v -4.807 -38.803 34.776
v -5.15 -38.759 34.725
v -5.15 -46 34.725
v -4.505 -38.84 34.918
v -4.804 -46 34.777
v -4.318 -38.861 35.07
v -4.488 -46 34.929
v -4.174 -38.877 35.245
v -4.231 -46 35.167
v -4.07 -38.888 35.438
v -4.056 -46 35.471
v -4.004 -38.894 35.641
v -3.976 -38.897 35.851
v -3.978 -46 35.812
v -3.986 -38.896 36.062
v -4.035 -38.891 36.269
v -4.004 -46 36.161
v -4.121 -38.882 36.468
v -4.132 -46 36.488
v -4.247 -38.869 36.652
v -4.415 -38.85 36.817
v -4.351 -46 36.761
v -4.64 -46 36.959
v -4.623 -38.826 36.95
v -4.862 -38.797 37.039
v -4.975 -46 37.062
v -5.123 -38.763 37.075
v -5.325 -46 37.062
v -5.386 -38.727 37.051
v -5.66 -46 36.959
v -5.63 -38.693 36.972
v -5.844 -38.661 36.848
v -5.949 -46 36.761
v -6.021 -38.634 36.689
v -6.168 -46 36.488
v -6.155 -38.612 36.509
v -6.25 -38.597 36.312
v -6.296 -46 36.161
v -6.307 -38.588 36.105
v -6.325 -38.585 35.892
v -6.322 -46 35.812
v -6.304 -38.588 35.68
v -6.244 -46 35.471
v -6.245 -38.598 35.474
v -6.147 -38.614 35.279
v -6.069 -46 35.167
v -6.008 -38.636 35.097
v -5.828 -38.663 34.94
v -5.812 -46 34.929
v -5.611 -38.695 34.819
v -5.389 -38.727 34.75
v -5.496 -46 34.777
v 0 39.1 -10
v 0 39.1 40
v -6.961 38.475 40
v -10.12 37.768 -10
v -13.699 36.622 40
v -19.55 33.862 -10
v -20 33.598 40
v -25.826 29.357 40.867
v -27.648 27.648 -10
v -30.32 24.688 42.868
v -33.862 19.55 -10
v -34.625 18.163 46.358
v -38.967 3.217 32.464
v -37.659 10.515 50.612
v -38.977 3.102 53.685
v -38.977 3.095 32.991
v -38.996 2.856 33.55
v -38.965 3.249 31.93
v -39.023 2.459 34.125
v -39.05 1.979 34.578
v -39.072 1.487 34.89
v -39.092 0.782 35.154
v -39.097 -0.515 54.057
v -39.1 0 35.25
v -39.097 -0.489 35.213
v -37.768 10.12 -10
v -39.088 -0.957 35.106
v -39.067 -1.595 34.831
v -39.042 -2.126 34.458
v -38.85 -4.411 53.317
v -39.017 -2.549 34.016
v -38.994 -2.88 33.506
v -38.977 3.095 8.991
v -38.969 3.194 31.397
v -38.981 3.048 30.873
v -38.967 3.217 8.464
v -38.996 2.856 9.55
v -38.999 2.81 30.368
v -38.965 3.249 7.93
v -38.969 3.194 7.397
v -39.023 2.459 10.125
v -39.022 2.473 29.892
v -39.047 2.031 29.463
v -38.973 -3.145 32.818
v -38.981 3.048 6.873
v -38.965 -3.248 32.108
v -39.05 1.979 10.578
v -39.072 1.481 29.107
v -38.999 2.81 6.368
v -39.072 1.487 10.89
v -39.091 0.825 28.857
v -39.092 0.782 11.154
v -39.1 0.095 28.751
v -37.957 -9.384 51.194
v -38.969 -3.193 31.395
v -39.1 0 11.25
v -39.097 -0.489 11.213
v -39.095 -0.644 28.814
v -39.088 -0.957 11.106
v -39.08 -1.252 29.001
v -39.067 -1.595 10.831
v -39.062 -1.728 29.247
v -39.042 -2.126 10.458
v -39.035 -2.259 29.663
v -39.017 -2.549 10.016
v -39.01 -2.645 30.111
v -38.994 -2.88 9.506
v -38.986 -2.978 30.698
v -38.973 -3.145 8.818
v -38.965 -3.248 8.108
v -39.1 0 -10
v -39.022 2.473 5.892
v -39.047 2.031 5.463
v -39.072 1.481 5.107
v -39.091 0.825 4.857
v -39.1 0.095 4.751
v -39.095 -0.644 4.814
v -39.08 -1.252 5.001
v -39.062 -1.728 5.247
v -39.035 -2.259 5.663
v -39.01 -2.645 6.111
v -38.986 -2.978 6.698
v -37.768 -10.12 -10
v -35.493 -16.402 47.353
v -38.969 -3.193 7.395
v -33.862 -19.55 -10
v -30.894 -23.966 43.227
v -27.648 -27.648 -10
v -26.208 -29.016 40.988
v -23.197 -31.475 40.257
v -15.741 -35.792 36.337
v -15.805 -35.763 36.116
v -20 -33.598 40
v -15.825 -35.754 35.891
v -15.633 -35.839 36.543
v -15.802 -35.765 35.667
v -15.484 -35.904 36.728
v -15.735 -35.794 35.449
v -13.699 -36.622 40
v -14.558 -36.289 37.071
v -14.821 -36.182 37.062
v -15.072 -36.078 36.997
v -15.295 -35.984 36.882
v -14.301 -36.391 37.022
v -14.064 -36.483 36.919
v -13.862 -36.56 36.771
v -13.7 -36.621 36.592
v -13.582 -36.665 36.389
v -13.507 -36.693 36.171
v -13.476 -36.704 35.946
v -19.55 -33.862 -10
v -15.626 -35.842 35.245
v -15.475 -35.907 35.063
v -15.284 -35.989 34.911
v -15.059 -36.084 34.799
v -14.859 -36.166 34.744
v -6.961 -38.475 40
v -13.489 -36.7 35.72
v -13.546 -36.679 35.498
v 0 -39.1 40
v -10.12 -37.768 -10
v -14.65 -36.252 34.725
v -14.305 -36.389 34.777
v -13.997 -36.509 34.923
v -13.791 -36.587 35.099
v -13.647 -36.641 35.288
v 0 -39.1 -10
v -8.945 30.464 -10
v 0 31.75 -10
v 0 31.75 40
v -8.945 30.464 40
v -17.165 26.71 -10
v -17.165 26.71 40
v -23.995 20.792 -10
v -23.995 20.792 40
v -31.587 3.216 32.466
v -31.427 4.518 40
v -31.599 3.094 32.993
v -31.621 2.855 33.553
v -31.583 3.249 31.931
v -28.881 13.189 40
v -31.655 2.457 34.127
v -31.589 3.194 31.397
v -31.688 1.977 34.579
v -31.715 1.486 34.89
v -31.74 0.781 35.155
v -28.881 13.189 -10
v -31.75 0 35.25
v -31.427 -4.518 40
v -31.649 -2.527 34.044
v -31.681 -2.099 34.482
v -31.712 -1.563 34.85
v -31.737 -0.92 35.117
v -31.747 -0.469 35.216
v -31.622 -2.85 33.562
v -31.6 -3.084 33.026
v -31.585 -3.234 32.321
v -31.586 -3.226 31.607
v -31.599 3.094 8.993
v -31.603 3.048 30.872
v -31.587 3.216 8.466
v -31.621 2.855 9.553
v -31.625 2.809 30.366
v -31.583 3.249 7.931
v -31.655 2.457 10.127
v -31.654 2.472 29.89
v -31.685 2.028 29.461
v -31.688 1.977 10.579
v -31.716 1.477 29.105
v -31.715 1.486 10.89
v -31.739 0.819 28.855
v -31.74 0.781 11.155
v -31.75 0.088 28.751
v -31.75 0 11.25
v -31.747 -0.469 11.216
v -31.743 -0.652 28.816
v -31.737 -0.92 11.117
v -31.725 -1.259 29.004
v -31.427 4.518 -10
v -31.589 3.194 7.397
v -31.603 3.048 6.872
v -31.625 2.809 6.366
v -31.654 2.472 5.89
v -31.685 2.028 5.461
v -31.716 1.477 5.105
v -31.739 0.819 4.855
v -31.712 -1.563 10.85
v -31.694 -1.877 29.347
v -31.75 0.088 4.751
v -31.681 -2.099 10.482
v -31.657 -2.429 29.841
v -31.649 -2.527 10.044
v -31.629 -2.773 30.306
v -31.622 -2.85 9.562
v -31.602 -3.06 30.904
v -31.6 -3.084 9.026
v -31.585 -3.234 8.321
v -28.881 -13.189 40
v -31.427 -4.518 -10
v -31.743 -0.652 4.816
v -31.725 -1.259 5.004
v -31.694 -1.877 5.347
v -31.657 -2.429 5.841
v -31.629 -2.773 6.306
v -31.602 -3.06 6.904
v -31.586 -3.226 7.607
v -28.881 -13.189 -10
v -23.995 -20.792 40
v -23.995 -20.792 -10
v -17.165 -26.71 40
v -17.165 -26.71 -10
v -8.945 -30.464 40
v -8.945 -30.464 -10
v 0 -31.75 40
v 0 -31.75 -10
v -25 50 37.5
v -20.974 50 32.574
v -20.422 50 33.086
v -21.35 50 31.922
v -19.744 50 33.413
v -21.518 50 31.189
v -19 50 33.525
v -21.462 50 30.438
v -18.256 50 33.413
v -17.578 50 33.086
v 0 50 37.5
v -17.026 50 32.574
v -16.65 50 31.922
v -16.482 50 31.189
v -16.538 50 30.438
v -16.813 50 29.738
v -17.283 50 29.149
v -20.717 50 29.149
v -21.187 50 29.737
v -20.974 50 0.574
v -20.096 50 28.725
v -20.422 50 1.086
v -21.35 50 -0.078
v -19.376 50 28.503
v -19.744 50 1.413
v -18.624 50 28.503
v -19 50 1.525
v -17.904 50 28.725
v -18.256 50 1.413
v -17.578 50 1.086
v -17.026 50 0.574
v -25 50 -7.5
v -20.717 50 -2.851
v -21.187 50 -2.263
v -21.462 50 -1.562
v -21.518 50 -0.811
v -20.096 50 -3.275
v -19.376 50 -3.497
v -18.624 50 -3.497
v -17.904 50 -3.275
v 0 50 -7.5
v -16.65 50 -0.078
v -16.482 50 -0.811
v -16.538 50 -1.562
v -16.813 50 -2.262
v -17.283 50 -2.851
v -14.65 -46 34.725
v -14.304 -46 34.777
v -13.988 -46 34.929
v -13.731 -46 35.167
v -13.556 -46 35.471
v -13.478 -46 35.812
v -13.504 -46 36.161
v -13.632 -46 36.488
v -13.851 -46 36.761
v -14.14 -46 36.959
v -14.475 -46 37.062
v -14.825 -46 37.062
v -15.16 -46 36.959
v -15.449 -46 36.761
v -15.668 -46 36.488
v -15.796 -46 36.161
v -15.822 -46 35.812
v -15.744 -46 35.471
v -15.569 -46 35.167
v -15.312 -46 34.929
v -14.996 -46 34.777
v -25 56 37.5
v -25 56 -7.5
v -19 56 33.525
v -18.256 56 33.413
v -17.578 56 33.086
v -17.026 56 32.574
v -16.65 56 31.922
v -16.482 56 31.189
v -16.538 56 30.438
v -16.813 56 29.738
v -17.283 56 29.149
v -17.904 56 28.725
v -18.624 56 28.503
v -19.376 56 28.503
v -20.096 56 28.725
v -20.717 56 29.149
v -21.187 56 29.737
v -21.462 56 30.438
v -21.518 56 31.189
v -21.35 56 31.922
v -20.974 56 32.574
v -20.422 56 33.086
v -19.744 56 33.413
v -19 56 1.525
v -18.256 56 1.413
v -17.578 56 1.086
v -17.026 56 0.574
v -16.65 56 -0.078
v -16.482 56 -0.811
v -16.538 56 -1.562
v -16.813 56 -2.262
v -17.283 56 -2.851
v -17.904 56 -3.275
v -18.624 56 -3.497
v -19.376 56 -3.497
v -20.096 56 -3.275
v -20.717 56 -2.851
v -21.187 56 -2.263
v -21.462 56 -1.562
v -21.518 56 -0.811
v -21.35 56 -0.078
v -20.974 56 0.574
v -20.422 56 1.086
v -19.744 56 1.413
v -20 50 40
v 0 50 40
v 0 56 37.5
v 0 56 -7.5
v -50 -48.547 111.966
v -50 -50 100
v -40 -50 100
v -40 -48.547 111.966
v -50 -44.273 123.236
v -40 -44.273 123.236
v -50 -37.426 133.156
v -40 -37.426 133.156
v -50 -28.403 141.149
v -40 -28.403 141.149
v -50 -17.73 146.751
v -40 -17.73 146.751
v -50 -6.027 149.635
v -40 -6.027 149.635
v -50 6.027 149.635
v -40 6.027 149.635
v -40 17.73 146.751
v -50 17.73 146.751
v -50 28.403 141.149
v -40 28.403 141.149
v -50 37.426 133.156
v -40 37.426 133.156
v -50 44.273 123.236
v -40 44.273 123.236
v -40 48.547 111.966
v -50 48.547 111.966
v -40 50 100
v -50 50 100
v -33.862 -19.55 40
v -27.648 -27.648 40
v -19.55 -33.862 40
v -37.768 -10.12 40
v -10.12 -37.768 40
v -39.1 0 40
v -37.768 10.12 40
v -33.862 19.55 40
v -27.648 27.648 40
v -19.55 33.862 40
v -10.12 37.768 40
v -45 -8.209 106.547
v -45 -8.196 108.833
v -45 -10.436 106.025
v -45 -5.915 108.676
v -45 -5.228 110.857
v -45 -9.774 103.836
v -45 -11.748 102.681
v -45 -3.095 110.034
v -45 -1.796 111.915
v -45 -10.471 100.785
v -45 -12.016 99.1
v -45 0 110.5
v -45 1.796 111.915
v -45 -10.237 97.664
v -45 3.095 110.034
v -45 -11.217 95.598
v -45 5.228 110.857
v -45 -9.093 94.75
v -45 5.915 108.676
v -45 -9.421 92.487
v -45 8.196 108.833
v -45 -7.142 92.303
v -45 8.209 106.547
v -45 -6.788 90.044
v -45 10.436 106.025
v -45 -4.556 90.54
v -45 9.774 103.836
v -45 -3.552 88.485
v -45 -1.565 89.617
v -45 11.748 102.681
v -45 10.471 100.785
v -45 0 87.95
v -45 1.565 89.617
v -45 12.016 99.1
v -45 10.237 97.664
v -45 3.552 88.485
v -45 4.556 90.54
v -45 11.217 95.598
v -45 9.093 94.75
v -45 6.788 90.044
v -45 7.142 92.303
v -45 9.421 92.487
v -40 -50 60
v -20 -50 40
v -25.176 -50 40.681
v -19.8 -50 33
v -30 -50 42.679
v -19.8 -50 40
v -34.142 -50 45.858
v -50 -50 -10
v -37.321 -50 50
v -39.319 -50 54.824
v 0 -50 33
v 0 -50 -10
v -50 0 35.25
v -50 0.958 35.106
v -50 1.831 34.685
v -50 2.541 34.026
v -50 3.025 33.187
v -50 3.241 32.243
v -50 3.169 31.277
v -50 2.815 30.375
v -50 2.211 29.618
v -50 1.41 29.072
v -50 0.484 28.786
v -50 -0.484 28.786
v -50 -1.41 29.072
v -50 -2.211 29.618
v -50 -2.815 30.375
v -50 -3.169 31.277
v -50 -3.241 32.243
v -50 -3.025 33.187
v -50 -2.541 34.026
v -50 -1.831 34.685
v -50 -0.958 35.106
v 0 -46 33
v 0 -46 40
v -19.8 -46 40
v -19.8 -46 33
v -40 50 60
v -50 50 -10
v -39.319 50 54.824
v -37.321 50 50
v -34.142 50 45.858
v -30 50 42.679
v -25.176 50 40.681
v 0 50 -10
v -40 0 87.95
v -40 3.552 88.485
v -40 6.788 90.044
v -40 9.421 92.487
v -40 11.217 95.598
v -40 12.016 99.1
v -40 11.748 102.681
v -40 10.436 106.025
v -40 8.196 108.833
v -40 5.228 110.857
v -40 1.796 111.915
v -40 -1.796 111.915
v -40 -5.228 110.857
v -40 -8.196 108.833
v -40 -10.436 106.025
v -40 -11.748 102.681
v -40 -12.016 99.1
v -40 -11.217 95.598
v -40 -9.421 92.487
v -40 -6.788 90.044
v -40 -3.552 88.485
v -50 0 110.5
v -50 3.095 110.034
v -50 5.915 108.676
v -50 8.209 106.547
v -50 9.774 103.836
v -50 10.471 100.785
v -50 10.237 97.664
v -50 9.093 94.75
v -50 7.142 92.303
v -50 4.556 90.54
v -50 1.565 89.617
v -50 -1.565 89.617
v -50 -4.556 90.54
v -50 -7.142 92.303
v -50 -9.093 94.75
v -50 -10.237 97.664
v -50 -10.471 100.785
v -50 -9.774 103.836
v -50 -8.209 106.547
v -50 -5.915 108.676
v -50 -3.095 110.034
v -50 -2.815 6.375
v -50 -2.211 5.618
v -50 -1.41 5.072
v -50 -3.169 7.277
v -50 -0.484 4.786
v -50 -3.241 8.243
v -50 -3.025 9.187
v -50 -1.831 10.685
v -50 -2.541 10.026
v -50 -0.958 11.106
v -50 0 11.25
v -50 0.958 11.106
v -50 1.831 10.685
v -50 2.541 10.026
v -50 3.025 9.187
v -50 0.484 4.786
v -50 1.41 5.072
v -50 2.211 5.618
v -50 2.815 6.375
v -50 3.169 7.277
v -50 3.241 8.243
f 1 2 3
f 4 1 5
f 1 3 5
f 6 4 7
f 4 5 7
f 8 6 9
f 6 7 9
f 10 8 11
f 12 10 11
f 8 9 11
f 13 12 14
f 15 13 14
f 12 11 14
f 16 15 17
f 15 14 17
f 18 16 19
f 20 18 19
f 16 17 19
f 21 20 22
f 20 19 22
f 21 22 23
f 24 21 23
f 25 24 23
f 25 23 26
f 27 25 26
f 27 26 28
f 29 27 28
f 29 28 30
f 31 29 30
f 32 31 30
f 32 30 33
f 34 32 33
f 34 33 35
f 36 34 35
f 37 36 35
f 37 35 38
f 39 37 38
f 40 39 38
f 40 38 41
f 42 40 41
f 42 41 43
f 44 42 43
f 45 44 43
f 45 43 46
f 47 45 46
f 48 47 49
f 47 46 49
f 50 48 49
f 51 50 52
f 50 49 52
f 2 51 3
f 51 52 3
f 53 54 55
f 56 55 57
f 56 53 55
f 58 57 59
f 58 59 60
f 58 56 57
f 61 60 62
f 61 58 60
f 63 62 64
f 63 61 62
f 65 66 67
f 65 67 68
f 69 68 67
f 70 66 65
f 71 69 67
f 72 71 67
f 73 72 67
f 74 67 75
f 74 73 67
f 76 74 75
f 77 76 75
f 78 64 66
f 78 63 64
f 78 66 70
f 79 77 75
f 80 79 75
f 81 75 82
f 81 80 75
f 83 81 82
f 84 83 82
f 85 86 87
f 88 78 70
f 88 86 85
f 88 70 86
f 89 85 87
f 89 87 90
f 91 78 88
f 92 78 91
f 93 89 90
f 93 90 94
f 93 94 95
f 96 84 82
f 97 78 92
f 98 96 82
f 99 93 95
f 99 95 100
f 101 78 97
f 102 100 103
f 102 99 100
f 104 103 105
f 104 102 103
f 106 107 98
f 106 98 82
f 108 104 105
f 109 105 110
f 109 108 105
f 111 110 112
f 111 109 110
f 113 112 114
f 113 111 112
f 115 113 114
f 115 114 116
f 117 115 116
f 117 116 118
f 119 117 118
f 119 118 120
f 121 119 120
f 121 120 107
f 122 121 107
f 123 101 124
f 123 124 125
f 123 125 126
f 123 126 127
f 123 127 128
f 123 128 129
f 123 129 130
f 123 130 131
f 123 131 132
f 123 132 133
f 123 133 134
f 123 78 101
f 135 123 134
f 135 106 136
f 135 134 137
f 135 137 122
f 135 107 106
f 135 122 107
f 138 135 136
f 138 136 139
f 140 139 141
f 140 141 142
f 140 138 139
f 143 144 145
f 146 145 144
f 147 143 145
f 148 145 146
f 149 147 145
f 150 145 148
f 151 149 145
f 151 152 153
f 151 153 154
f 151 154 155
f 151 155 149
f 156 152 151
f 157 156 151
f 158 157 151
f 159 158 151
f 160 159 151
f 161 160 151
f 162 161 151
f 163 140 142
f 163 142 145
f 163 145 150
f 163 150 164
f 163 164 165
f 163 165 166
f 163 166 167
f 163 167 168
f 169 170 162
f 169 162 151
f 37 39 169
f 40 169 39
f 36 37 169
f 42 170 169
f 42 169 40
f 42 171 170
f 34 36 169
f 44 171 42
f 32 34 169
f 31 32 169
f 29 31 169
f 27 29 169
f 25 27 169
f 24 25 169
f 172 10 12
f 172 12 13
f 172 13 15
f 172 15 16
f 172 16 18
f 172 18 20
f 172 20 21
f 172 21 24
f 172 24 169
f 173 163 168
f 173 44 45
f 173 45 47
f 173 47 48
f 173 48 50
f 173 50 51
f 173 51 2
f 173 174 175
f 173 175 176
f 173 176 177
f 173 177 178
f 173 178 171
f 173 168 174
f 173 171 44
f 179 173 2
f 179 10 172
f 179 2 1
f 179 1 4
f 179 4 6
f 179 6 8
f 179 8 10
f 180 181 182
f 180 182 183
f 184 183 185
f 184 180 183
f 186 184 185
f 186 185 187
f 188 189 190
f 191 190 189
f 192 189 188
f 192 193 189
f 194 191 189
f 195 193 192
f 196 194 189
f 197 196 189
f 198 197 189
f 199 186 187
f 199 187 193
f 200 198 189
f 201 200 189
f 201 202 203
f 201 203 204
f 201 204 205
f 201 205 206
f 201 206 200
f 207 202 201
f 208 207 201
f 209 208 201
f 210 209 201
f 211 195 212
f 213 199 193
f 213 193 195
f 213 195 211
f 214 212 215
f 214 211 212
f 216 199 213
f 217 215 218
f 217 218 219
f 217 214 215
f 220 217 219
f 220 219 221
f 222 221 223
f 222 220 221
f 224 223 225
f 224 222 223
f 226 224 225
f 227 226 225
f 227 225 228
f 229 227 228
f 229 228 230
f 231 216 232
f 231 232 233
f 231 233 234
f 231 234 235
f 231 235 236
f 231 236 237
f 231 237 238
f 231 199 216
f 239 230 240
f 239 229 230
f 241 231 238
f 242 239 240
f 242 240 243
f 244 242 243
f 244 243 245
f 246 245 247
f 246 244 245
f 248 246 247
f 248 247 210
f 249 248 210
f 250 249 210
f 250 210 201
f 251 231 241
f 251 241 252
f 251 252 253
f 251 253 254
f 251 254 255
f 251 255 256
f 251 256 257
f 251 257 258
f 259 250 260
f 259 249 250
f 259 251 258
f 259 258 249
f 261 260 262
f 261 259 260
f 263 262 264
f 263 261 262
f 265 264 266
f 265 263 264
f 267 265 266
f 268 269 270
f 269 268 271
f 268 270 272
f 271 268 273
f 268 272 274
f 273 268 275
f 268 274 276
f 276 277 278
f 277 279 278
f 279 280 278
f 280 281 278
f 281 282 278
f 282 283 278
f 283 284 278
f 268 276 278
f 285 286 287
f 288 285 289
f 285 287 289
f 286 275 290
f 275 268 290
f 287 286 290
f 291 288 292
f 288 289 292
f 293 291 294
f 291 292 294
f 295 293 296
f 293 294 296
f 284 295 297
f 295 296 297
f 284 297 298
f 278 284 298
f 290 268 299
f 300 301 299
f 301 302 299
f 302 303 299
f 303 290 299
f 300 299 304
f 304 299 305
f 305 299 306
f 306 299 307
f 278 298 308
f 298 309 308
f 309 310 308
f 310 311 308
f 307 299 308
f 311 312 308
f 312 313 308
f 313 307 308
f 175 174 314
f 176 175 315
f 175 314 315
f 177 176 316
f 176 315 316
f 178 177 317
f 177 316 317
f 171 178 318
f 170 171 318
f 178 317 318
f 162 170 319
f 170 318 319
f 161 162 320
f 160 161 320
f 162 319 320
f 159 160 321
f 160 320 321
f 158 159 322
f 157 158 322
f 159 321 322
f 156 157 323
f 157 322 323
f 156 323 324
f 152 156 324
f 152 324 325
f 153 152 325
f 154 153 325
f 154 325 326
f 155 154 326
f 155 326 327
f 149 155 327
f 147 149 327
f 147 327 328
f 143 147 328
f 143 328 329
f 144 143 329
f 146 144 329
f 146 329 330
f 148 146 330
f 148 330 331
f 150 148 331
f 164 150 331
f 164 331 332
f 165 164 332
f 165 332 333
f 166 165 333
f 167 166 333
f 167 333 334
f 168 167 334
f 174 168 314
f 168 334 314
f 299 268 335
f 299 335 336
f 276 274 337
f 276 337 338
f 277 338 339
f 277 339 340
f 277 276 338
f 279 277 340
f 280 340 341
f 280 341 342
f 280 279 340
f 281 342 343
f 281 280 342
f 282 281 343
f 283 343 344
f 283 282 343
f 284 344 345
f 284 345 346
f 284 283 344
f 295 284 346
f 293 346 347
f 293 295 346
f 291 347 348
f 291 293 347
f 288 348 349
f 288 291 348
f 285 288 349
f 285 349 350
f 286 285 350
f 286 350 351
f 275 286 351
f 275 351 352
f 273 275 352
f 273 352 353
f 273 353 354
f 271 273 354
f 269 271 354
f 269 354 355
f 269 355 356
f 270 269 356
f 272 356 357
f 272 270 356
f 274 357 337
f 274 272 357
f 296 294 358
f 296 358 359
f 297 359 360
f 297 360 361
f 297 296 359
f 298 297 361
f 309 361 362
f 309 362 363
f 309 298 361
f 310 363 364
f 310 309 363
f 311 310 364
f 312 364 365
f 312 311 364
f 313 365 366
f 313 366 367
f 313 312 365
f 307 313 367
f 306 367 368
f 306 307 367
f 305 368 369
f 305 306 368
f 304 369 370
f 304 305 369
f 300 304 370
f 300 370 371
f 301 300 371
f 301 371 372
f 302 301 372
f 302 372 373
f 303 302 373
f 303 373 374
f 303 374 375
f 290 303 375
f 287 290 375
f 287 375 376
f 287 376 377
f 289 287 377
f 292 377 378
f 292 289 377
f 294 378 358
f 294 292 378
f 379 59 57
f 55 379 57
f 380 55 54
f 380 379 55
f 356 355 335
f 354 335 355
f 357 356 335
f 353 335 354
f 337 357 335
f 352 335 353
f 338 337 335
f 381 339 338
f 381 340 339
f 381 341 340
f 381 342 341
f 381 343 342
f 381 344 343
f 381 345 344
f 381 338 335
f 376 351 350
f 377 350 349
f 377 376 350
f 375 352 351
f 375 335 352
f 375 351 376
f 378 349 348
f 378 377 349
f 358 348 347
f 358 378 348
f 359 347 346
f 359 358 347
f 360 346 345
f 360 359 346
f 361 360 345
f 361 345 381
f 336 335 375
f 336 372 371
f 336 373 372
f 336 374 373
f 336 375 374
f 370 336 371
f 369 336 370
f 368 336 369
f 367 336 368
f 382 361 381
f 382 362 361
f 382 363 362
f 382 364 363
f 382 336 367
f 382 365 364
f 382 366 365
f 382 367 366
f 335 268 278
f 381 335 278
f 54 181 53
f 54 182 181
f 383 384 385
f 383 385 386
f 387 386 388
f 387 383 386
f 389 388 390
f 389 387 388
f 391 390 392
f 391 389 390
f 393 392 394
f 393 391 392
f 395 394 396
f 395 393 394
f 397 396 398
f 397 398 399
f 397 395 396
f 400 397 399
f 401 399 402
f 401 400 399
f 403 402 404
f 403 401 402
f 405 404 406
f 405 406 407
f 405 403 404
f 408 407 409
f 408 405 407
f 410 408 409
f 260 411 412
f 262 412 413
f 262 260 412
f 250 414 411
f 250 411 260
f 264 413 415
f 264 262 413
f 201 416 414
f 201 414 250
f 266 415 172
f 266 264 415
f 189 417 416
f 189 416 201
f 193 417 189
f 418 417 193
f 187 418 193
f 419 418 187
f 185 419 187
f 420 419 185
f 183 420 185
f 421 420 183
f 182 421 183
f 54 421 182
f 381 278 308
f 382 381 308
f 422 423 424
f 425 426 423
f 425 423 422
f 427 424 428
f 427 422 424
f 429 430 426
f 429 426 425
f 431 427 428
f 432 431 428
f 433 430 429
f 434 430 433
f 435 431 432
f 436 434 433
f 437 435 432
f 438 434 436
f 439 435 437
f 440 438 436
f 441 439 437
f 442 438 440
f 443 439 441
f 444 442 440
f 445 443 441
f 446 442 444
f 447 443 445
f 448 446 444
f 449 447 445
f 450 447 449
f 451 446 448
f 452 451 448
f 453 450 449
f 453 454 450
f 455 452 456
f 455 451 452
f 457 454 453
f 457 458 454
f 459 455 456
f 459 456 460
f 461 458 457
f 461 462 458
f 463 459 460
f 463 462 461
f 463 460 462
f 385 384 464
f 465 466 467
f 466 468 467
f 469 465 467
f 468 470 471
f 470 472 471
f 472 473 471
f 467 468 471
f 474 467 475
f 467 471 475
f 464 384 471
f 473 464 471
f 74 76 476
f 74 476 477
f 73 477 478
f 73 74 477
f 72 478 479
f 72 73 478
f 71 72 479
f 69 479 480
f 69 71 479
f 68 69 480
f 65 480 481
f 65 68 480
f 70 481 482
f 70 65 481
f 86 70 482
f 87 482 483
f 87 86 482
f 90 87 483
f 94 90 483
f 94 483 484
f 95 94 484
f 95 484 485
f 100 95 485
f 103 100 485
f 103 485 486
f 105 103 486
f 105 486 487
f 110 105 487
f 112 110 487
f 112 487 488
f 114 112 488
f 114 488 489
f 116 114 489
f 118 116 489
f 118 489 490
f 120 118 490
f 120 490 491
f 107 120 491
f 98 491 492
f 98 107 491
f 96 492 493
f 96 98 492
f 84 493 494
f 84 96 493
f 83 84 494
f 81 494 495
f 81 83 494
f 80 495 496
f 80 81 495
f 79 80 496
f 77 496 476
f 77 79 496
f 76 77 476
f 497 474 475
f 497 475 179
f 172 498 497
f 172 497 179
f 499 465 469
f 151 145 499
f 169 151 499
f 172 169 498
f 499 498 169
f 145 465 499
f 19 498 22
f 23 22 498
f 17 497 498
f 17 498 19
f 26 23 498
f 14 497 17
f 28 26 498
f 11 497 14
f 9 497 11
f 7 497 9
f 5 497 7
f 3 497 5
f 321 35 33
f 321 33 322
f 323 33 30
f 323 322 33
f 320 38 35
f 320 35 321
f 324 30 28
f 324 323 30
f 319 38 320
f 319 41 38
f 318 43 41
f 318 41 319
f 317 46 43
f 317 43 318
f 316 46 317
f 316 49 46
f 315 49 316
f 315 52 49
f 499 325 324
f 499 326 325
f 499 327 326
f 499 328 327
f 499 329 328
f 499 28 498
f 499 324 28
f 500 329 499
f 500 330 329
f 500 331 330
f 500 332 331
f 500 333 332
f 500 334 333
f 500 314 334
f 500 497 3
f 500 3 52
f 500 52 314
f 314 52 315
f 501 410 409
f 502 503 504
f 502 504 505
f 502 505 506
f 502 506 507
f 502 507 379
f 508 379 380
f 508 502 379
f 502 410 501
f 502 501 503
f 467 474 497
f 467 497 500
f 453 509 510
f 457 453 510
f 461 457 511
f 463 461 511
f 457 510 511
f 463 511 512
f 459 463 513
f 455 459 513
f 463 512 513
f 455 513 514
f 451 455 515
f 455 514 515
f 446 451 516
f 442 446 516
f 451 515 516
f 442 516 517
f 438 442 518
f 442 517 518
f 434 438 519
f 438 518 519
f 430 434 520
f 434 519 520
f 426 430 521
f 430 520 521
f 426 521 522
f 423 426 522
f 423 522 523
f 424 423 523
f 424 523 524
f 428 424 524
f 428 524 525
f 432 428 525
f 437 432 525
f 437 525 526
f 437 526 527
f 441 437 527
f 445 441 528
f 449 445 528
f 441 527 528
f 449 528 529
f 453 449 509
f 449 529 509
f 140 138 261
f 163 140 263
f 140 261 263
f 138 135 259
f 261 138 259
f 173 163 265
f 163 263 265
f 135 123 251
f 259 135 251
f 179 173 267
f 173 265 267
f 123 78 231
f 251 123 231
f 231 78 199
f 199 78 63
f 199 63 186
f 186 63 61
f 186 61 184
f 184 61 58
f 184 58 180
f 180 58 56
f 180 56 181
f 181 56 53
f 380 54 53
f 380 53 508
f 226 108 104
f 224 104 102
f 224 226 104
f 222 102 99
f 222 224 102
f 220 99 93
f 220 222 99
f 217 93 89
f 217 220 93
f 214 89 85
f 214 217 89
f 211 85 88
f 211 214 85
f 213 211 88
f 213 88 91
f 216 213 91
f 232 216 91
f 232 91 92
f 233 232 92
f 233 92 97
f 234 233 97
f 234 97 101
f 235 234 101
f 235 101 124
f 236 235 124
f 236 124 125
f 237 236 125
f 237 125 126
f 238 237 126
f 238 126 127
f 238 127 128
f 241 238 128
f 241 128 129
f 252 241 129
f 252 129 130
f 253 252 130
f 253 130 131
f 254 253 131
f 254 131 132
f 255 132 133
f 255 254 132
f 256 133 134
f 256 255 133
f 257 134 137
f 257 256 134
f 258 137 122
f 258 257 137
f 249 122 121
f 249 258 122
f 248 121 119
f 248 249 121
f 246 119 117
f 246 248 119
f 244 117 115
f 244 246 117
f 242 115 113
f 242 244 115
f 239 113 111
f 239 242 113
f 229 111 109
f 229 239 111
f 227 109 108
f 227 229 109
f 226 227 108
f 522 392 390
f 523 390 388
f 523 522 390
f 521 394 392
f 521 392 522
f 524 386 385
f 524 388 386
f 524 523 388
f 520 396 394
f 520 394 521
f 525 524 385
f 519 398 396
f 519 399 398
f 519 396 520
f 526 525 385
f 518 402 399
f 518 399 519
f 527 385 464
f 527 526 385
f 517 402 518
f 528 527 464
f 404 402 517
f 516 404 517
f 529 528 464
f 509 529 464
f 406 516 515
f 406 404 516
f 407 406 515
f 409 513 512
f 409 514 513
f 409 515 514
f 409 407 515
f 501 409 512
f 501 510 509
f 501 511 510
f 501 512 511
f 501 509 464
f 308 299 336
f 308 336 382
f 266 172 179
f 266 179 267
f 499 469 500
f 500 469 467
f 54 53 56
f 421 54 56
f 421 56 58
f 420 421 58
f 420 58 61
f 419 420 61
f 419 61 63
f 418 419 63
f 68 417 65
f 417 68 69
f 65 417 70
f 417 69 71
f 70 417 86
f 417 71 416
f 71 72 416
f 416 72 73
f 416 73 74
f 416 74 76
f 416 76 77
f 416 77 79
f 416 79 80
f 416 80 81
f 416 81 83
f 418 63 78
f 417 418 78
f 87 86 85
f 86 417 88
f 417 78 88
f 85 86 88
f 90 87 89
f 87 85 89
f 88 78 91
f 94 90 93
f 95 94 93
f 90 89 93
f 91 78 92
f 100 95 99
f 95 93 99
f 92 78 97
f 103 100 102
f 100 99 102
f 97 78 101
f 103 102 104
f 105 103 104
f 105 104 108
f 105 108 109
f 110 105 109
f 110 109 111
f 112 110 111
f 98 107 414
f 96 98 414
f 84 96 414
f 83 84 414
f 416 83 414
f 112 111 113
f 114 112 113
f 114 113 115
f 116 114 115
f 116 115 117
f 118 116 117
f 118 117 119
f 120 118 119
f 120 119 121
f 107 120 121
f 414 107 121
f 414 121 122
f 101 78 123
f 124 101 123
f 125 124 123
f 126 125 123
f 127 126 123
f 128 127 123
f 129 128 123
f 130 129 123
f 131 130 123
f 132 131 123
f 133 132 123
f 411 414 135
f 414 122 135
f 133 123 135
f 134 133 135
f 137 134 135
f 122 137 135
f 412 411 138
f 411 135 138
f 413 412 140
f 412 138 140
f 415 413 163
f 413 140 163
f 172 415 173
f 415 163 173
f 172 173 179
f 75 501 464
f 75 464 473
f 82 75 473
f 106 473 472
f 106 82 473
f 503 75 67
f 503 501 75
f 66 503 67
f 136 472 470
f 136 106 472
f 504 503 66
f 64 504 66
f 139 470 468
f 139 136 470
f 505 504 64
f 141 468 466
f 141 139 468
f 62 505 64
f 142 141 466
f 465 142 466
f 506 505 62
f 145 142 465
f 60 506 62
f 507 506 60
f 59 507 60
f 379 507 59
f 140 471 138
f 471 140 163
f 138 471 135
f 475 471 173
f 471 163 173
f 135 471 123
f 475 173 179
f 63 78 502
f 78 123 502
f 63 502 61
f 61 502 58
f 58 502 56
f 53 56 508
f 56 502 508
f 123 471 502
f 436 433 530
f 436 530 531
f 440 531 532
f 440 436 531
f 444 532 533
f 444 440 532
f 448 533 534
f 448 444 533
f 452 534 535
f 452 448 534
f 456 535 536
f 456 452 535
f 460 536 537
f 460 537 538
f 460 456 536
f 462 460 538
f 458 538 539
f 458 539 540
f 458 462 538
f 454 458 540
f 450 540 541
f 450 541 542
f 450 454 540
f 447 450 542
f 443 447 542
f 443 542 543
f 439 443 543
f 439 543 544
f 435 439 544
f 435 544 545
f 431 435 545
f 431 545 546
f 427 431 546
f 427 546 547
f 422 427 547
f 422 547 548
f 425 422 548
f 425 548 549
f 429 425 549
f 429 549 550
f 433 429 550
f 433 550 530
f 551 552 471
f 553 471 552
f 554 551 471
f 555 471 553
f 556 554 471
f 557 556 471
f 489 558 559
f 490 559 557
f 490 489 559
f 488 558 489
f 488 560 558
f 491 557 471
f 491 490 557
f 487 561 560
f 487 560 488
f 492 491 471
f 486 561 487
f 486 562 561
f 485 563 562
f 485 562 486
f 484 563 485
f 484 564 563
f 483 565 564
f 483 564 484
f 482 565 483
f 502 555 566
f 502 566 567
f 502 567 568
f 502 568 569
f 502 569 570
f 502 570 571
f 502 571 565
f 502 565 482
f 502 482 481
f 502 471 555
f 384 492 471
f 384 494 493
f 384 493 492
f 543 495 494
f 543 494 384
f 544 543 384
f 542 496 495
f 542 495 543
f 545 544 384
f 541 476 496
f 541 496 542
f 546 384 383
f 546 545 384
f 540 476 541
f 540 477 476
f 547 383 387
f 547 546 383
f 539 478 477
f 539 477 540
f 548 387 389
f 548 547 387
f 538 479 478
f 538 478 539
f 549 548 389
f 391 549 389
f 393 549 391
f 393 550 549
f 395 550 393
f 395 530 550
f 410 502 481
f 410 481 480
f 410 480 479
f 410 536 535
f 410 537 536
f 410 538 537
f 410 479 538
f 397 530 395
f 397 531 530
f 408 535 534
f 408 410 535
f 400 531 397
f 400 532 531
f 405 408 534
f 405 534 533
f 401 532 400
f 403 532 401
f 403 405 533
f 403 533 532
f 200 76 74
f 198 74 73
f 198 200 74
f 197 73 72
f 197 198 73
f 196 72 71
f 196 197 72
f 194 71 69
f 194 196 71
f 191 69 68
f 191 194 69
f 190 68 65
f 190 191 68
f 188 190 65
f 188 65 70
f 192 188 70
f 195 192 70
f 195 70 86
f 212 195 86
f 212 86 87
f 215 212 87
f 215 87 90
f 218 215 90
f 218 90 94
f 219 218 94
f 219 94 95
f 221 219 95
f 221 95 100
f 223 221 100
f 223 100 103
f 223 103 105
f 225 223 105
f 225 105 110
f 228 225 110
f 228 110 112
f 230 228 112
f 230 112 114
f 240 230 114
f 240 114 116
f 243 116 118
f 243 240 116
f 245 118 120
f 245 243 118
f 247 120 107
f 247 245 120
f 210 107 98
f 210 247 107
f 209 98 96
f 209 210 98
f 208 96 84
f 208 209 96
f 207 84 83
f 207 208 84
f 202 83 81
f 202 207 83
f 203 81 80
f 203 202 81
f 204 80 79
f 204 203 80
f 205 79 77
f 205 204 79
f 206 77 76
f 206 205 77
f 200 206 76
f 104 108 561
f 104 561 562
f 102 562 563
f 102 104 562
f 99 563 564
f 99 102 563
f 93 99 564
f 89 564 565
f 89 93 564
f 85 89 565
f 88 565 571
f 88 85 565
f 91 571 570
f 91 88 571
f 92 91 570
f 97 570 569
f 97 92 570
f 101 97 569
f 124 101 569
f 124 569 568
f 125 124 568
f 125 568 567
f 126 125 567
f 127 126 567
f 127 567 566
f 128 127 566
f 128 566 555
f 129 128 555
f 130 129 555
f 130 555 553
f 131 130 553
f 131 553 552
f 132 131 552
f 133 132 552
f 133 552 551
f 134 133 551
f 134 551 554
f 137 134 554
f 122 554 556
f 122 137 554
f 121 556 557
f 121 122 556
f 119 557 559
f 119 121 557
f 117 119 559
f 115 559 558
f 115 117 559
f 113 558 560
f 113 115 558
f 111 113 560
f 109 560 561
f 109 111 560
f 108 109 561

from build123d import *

# Parameters (mm, degrees)
CENTRE_HOLE_FOR_L2_DEPTH      = 40
CENTRE_HOLE_FOR_L2_DEPTH_BACK = 10
SKETCH1_R                     = 39.1
SKETCH1_R_2                   = 31.75
MAIN_STRUCTURE_DEPTH          = 60
MAIN_STRUCTURE_DEPTH_BACK     = 50
SKETCH2_W                     = 100
SKETCH2_H                     = 100
SKETCH2_R                     = 39.1
BEARING_CURVE_DEPTH           = 10
SHAFT_START                   = -10
SHAFT_HOLE_OUTLINE_R          = 10.5
SHAFT_HOLE_DEPTH              = 10
WRIST_CUTOUT_DEPTH            = 188.082869339
SKETCH9_R                     = 12.05
BEARING_DEPTH                 = 5
SURFACECUT1_OUTLINE_R         = 10.5
SURFACECUT1_DEPTH             = 50
SKETCH11_W                    = 25
SKETCH11_H                    = 45
SKETCH11_R                    = 2.525
BOSS_EXTRUDE1_DEPTH           = 6
SKETCH15_W                    = 19.8
SKETCH15_H                    = 7
CUT_EXTRUDE4_DEPTH            = 4
CUT_EXTRUDE5_REACH            = 190.16
CUT_EXTRUDE5_END_RADIUS       = 39.1
SKETCH16_R                    = 1.175
CUT_EXTRUDE6_DEPTH            = 168.7378908
CUT_EXTRUDE6_DEPTH_BACK       = 168.7378908
SKETCH18_R                    = 3.25


# Read off the part's stored shape, not the designer's step: Shaft Hole, SurfaceCut1
with BuildPart() as part:
    # Sketch1 → Centre Hole for L2 (new, two sides: drawn at the far end of the back side and taken through both)
    with BuildSketch(Plane.XY.offset(-CENTRE_HOLE_FOR_L2_DEPTH_BACK)):
        Circle(SKETCH1_R)
        Circle(SKETCH1_R_2, mode=Mode.SUBTRACT)
    extrude(amount=CENTRE_HOLE_FOR_L2_DEPTH + CENTRE_HOLE_FOR_L2_DEPTH_BACK)


with BuildPart() as body_2:
    # Sketch2 → Main Structure (new, two sides: drawn at the far end of the back side and taken through both)
    with BuildSketch(Plane.XY.offset(40).offset(-MAIN_STRUCTURE_DEPTH_BACK)):
        Rectangle(SKETCH2_W, SKETCH2_H)
        Circle(SKETCH2_R, mode=Mode.SUBTRACT)
    extrude(amount=MAIN_STRUCTURE_DEPTH + MAIN_STRUCTURE_DEPTH_BACK)

    # Sketch3 → Bearing Curve (add)
    with BuildSketch(Plane.ZY.offset(50)):
        with BuildLine():
            Line((100, 50), (100, -50))
            ThreePointArc((100, -50), (150, 0), (100, 50))
        make_face()
    bearing_curve = extrude(amount=-BEARING_CURVE_DEPTH)

    # Upright Mirror: Bearing Curve across plane
    add(bearing_curve.mirror(Plane(origin=(0, 0, 0), x_dir=(0, 0, 1), z_dir=(1, 0, 0))))

    # Shaft Hole outline → Shaft Hole (cut)
    with BuildSketch(Plane.ZY.offset(50).offset(SHAFT_START)):
        with Locations((100, 0)):
            Circle(SHAFT_HOLE_OUTLINE_R)
    shaft_hole = extrude(amount=SHAFT_HOLE_DEPTH, mode=Mode.SUBTRACT)

    # Sketch4 → Wrist Cutout (cut, through all)
    with BuildSketch(Plane(origin=(0, 50, 0), x_dir=(1, 0, 0), z_dir=(0, 1, 0))):
        with BuildLine():
            Line((-40, -100), (-40, -60))
            ThreePointArc((-40, -60), (-34.142135624, -45.857864376), (-20, -40))
            Line((-20, -40), (20, -40))
            ThreePointArc((20, -40), (34.142135624, -45.857864376), (40, -60))
            Line((40, -60), (40, -100))
            Line((40, -100), (-40, -100))
        make_face()
    extrude(amount=-WRIST_CUTOUT_DEPTH, mode=Mode.SUBTRACT)

    # Sketch9 → Bearing (cut)
    with BuildSketch(Plane(origin=(-40, 0, 0), x_dir=(0, 0, -1), z_dir=(1, 0, 0))):
        with Locations((-100, 0)):
            Circle(SKETCH9_R)
    bearing = extrude(amount=-BEARING_DEPTH, mode=Mode.SUBTRACT)

    # Bearing Mirror: Shaft Hole, Bearing across plane
    add(shaft_hole.mirror(Plane(origin=(0, 0, 0), x_dir=(0, 0, 1), z_dir=(1, 0, 0))), mode=Mode.SUBTRACT)
    add(bearing.mirror(Plane(origin=(0, 0, 0), x_dir=(0, 0, 1), z_dir=(1, 0, 0))), mode=Mode.SUBTRACT)


with BuildPart() as surfacecut1_tool:
    # SurfaceCut1 outline → SurfaceCut1 (new body)
    with BuildSketch(Plane.YZ):
        with BuildLine():
            ThreePointArc((50, 100), (0, 150), (-50, 100))
            Line((-50, 100), (-50, -10))
            Line((-50, -10), (50, -10))
            Line((50, -10), (50, 100))
        make_face()
        with Locations((0, 100)):
            Circle(SURFACECUT1_OUTLINE_R, mode=Mode.SUBTRACT)
    extrude(amount=SURFACECUT1_DEPTH)


with BuildPart() as part_1:
    add(part.part)

    # SurfaceCut1: cut by surfacecut1_tool
    add(surfacecut1_tool.part, mode=Mode.SUBTRACT)


with BuildPart() as body_2_1:
    add(body_2.part)

    # SurfaceCut1: cut by surfacecut1_tool
    add(surfacecut1_tool.part, mode=Mode.SUBTRACT)

    # Sketch15 → Cut-Extrude4 (cut)
    with BuildSketch(Plane(origin=(0, -50, 0), x_dir=(-1, 0, 0), z_dir=(0, -1, 0))):
        with Locations((9.9, -36.5)):
            Rectangle(SKETCH15_W, SKETCH15_H)
    extrude(amount=-CUT_EXTRUDE4_DEPTH, mode=Mode.SUBTRACT)

    # Cut-Extrude5: up to this cylinder (the profile starts outside it)
    cut_extrude5_end = Plane(origin=(0, 0, 35.9), z_dir=(0, 0, 1)) * Cylinder(CUT_EXTRUDE5_END_RADIUS, 459.52, mode=Mode.PRIVATE)
    # Sketch16 → Cut-Extrude5 (cut, up to the surface)
    with BuildSketch(Plane(origin=(0, -46, 0), x_dir=(-1, 0, 0), z_dir=(0, -1, 0)), mode=Mode.PRIVATE) as cut_extrude5_sk1:
        with Locations(Location((14.65, -35.9, 0), (0, 0, 90))):
            Circle(SKETCH16_R)
    cut_extrude5_tool1 = extrude(cut_extrude5_sk1.sketch, amount=-CUT_EXTRUDE5_REACH, mode=Mode.PRIVATE) - cut_extrude5_end
    add(cut_extrude5_tool1.solids().sort_by_distance((-14.65, -46, 35.9))[0], mode=Mode.SUBTRACT)
    # Sketch16 → Cut-Extrude5 (cut, up to the surface)
    with BuildSketch(Plane(origin=(0, -46, 0), x_dir=(-1, 0, 0), z_dir=(0, -1, 0)), mode=Mode.PRIVATE) as cut_extrude5_sk2:
        with Locations(Location((5.15, -35.9, 0), (0, 0, 90))):
            Circle(SKETCH16_R)
    cut_extrude5_tool2 = extrude(cut_extrude5_sk2.sketch, amount=-CUT_EXTRUDE5_REACH, mode=Mode.PRIVATE) - cut_extrude5_end
    add(cut_extrude5_tool2.solids().sort_by_distance((-5.15, -46, 35.9))[0], mode=Mode.SUBTRACT)


with BuildPart() as body_3:
    # Sketch11 → Boss-Extrude1 (new body)
    with BuildSketch(Plane(origin=(0, 50, 0), x_dir=(1, 0, 0), z_dir=(0, 1, 0))):
        with Locations((-12.5, -15)):
            Rectangle(SKETCH11_W, SKETCH11_H)
        with Locations(Location((-19, 1, 0), (0, 0, 270))):
            Circle(SKETCH11_R, mode=Mode.SUBTRACT)
        with Locations(Location((-19, -31, 0), (0, 0, 270))):
            Circle(SKETCH11_R, mode=Mode.SUBTRACT)
    extrude(amount=BOSS_EXTRUDE1_DEPTH)


with BuildPart() as cut_extrude6_tool:
    # Sketch18 → Cut-Extrude6 (new, two sides: drawn at the far end of the back side and taken through both)
    with BuildSketch(Plane.ZY.offset(50).offset(-CUT_EXTRUDE6_DEPTH_BACK)):
        with Locations((8, 0)):
            Circle(SKETCH18_R)
        with Locations((32, 0)):
            Circle(SKETCH18_R)
    extrude(amount=CUT_EXTRUDE6_DEPTH + CUT_EXTRUDE6_DEPTH_BACK)


with BuildPart() as part_2:
    add(part_1.part)

    # Cut-Extrude6: cut by cut_extrude6_tool
    add(cut_extrude6_tool.part, mode=Mode.SUBTRACT)


with BuildPart() as body_2_2:
    add(body_2_1.part)

    # Cut-Extrude6: cut by cut_extrude6_tool
    add(cut_extrude6_tool.part, mode=Mode.SUBTRACT)


solid = Compound([body_3.part, part_2.part, body_2_2.part])
